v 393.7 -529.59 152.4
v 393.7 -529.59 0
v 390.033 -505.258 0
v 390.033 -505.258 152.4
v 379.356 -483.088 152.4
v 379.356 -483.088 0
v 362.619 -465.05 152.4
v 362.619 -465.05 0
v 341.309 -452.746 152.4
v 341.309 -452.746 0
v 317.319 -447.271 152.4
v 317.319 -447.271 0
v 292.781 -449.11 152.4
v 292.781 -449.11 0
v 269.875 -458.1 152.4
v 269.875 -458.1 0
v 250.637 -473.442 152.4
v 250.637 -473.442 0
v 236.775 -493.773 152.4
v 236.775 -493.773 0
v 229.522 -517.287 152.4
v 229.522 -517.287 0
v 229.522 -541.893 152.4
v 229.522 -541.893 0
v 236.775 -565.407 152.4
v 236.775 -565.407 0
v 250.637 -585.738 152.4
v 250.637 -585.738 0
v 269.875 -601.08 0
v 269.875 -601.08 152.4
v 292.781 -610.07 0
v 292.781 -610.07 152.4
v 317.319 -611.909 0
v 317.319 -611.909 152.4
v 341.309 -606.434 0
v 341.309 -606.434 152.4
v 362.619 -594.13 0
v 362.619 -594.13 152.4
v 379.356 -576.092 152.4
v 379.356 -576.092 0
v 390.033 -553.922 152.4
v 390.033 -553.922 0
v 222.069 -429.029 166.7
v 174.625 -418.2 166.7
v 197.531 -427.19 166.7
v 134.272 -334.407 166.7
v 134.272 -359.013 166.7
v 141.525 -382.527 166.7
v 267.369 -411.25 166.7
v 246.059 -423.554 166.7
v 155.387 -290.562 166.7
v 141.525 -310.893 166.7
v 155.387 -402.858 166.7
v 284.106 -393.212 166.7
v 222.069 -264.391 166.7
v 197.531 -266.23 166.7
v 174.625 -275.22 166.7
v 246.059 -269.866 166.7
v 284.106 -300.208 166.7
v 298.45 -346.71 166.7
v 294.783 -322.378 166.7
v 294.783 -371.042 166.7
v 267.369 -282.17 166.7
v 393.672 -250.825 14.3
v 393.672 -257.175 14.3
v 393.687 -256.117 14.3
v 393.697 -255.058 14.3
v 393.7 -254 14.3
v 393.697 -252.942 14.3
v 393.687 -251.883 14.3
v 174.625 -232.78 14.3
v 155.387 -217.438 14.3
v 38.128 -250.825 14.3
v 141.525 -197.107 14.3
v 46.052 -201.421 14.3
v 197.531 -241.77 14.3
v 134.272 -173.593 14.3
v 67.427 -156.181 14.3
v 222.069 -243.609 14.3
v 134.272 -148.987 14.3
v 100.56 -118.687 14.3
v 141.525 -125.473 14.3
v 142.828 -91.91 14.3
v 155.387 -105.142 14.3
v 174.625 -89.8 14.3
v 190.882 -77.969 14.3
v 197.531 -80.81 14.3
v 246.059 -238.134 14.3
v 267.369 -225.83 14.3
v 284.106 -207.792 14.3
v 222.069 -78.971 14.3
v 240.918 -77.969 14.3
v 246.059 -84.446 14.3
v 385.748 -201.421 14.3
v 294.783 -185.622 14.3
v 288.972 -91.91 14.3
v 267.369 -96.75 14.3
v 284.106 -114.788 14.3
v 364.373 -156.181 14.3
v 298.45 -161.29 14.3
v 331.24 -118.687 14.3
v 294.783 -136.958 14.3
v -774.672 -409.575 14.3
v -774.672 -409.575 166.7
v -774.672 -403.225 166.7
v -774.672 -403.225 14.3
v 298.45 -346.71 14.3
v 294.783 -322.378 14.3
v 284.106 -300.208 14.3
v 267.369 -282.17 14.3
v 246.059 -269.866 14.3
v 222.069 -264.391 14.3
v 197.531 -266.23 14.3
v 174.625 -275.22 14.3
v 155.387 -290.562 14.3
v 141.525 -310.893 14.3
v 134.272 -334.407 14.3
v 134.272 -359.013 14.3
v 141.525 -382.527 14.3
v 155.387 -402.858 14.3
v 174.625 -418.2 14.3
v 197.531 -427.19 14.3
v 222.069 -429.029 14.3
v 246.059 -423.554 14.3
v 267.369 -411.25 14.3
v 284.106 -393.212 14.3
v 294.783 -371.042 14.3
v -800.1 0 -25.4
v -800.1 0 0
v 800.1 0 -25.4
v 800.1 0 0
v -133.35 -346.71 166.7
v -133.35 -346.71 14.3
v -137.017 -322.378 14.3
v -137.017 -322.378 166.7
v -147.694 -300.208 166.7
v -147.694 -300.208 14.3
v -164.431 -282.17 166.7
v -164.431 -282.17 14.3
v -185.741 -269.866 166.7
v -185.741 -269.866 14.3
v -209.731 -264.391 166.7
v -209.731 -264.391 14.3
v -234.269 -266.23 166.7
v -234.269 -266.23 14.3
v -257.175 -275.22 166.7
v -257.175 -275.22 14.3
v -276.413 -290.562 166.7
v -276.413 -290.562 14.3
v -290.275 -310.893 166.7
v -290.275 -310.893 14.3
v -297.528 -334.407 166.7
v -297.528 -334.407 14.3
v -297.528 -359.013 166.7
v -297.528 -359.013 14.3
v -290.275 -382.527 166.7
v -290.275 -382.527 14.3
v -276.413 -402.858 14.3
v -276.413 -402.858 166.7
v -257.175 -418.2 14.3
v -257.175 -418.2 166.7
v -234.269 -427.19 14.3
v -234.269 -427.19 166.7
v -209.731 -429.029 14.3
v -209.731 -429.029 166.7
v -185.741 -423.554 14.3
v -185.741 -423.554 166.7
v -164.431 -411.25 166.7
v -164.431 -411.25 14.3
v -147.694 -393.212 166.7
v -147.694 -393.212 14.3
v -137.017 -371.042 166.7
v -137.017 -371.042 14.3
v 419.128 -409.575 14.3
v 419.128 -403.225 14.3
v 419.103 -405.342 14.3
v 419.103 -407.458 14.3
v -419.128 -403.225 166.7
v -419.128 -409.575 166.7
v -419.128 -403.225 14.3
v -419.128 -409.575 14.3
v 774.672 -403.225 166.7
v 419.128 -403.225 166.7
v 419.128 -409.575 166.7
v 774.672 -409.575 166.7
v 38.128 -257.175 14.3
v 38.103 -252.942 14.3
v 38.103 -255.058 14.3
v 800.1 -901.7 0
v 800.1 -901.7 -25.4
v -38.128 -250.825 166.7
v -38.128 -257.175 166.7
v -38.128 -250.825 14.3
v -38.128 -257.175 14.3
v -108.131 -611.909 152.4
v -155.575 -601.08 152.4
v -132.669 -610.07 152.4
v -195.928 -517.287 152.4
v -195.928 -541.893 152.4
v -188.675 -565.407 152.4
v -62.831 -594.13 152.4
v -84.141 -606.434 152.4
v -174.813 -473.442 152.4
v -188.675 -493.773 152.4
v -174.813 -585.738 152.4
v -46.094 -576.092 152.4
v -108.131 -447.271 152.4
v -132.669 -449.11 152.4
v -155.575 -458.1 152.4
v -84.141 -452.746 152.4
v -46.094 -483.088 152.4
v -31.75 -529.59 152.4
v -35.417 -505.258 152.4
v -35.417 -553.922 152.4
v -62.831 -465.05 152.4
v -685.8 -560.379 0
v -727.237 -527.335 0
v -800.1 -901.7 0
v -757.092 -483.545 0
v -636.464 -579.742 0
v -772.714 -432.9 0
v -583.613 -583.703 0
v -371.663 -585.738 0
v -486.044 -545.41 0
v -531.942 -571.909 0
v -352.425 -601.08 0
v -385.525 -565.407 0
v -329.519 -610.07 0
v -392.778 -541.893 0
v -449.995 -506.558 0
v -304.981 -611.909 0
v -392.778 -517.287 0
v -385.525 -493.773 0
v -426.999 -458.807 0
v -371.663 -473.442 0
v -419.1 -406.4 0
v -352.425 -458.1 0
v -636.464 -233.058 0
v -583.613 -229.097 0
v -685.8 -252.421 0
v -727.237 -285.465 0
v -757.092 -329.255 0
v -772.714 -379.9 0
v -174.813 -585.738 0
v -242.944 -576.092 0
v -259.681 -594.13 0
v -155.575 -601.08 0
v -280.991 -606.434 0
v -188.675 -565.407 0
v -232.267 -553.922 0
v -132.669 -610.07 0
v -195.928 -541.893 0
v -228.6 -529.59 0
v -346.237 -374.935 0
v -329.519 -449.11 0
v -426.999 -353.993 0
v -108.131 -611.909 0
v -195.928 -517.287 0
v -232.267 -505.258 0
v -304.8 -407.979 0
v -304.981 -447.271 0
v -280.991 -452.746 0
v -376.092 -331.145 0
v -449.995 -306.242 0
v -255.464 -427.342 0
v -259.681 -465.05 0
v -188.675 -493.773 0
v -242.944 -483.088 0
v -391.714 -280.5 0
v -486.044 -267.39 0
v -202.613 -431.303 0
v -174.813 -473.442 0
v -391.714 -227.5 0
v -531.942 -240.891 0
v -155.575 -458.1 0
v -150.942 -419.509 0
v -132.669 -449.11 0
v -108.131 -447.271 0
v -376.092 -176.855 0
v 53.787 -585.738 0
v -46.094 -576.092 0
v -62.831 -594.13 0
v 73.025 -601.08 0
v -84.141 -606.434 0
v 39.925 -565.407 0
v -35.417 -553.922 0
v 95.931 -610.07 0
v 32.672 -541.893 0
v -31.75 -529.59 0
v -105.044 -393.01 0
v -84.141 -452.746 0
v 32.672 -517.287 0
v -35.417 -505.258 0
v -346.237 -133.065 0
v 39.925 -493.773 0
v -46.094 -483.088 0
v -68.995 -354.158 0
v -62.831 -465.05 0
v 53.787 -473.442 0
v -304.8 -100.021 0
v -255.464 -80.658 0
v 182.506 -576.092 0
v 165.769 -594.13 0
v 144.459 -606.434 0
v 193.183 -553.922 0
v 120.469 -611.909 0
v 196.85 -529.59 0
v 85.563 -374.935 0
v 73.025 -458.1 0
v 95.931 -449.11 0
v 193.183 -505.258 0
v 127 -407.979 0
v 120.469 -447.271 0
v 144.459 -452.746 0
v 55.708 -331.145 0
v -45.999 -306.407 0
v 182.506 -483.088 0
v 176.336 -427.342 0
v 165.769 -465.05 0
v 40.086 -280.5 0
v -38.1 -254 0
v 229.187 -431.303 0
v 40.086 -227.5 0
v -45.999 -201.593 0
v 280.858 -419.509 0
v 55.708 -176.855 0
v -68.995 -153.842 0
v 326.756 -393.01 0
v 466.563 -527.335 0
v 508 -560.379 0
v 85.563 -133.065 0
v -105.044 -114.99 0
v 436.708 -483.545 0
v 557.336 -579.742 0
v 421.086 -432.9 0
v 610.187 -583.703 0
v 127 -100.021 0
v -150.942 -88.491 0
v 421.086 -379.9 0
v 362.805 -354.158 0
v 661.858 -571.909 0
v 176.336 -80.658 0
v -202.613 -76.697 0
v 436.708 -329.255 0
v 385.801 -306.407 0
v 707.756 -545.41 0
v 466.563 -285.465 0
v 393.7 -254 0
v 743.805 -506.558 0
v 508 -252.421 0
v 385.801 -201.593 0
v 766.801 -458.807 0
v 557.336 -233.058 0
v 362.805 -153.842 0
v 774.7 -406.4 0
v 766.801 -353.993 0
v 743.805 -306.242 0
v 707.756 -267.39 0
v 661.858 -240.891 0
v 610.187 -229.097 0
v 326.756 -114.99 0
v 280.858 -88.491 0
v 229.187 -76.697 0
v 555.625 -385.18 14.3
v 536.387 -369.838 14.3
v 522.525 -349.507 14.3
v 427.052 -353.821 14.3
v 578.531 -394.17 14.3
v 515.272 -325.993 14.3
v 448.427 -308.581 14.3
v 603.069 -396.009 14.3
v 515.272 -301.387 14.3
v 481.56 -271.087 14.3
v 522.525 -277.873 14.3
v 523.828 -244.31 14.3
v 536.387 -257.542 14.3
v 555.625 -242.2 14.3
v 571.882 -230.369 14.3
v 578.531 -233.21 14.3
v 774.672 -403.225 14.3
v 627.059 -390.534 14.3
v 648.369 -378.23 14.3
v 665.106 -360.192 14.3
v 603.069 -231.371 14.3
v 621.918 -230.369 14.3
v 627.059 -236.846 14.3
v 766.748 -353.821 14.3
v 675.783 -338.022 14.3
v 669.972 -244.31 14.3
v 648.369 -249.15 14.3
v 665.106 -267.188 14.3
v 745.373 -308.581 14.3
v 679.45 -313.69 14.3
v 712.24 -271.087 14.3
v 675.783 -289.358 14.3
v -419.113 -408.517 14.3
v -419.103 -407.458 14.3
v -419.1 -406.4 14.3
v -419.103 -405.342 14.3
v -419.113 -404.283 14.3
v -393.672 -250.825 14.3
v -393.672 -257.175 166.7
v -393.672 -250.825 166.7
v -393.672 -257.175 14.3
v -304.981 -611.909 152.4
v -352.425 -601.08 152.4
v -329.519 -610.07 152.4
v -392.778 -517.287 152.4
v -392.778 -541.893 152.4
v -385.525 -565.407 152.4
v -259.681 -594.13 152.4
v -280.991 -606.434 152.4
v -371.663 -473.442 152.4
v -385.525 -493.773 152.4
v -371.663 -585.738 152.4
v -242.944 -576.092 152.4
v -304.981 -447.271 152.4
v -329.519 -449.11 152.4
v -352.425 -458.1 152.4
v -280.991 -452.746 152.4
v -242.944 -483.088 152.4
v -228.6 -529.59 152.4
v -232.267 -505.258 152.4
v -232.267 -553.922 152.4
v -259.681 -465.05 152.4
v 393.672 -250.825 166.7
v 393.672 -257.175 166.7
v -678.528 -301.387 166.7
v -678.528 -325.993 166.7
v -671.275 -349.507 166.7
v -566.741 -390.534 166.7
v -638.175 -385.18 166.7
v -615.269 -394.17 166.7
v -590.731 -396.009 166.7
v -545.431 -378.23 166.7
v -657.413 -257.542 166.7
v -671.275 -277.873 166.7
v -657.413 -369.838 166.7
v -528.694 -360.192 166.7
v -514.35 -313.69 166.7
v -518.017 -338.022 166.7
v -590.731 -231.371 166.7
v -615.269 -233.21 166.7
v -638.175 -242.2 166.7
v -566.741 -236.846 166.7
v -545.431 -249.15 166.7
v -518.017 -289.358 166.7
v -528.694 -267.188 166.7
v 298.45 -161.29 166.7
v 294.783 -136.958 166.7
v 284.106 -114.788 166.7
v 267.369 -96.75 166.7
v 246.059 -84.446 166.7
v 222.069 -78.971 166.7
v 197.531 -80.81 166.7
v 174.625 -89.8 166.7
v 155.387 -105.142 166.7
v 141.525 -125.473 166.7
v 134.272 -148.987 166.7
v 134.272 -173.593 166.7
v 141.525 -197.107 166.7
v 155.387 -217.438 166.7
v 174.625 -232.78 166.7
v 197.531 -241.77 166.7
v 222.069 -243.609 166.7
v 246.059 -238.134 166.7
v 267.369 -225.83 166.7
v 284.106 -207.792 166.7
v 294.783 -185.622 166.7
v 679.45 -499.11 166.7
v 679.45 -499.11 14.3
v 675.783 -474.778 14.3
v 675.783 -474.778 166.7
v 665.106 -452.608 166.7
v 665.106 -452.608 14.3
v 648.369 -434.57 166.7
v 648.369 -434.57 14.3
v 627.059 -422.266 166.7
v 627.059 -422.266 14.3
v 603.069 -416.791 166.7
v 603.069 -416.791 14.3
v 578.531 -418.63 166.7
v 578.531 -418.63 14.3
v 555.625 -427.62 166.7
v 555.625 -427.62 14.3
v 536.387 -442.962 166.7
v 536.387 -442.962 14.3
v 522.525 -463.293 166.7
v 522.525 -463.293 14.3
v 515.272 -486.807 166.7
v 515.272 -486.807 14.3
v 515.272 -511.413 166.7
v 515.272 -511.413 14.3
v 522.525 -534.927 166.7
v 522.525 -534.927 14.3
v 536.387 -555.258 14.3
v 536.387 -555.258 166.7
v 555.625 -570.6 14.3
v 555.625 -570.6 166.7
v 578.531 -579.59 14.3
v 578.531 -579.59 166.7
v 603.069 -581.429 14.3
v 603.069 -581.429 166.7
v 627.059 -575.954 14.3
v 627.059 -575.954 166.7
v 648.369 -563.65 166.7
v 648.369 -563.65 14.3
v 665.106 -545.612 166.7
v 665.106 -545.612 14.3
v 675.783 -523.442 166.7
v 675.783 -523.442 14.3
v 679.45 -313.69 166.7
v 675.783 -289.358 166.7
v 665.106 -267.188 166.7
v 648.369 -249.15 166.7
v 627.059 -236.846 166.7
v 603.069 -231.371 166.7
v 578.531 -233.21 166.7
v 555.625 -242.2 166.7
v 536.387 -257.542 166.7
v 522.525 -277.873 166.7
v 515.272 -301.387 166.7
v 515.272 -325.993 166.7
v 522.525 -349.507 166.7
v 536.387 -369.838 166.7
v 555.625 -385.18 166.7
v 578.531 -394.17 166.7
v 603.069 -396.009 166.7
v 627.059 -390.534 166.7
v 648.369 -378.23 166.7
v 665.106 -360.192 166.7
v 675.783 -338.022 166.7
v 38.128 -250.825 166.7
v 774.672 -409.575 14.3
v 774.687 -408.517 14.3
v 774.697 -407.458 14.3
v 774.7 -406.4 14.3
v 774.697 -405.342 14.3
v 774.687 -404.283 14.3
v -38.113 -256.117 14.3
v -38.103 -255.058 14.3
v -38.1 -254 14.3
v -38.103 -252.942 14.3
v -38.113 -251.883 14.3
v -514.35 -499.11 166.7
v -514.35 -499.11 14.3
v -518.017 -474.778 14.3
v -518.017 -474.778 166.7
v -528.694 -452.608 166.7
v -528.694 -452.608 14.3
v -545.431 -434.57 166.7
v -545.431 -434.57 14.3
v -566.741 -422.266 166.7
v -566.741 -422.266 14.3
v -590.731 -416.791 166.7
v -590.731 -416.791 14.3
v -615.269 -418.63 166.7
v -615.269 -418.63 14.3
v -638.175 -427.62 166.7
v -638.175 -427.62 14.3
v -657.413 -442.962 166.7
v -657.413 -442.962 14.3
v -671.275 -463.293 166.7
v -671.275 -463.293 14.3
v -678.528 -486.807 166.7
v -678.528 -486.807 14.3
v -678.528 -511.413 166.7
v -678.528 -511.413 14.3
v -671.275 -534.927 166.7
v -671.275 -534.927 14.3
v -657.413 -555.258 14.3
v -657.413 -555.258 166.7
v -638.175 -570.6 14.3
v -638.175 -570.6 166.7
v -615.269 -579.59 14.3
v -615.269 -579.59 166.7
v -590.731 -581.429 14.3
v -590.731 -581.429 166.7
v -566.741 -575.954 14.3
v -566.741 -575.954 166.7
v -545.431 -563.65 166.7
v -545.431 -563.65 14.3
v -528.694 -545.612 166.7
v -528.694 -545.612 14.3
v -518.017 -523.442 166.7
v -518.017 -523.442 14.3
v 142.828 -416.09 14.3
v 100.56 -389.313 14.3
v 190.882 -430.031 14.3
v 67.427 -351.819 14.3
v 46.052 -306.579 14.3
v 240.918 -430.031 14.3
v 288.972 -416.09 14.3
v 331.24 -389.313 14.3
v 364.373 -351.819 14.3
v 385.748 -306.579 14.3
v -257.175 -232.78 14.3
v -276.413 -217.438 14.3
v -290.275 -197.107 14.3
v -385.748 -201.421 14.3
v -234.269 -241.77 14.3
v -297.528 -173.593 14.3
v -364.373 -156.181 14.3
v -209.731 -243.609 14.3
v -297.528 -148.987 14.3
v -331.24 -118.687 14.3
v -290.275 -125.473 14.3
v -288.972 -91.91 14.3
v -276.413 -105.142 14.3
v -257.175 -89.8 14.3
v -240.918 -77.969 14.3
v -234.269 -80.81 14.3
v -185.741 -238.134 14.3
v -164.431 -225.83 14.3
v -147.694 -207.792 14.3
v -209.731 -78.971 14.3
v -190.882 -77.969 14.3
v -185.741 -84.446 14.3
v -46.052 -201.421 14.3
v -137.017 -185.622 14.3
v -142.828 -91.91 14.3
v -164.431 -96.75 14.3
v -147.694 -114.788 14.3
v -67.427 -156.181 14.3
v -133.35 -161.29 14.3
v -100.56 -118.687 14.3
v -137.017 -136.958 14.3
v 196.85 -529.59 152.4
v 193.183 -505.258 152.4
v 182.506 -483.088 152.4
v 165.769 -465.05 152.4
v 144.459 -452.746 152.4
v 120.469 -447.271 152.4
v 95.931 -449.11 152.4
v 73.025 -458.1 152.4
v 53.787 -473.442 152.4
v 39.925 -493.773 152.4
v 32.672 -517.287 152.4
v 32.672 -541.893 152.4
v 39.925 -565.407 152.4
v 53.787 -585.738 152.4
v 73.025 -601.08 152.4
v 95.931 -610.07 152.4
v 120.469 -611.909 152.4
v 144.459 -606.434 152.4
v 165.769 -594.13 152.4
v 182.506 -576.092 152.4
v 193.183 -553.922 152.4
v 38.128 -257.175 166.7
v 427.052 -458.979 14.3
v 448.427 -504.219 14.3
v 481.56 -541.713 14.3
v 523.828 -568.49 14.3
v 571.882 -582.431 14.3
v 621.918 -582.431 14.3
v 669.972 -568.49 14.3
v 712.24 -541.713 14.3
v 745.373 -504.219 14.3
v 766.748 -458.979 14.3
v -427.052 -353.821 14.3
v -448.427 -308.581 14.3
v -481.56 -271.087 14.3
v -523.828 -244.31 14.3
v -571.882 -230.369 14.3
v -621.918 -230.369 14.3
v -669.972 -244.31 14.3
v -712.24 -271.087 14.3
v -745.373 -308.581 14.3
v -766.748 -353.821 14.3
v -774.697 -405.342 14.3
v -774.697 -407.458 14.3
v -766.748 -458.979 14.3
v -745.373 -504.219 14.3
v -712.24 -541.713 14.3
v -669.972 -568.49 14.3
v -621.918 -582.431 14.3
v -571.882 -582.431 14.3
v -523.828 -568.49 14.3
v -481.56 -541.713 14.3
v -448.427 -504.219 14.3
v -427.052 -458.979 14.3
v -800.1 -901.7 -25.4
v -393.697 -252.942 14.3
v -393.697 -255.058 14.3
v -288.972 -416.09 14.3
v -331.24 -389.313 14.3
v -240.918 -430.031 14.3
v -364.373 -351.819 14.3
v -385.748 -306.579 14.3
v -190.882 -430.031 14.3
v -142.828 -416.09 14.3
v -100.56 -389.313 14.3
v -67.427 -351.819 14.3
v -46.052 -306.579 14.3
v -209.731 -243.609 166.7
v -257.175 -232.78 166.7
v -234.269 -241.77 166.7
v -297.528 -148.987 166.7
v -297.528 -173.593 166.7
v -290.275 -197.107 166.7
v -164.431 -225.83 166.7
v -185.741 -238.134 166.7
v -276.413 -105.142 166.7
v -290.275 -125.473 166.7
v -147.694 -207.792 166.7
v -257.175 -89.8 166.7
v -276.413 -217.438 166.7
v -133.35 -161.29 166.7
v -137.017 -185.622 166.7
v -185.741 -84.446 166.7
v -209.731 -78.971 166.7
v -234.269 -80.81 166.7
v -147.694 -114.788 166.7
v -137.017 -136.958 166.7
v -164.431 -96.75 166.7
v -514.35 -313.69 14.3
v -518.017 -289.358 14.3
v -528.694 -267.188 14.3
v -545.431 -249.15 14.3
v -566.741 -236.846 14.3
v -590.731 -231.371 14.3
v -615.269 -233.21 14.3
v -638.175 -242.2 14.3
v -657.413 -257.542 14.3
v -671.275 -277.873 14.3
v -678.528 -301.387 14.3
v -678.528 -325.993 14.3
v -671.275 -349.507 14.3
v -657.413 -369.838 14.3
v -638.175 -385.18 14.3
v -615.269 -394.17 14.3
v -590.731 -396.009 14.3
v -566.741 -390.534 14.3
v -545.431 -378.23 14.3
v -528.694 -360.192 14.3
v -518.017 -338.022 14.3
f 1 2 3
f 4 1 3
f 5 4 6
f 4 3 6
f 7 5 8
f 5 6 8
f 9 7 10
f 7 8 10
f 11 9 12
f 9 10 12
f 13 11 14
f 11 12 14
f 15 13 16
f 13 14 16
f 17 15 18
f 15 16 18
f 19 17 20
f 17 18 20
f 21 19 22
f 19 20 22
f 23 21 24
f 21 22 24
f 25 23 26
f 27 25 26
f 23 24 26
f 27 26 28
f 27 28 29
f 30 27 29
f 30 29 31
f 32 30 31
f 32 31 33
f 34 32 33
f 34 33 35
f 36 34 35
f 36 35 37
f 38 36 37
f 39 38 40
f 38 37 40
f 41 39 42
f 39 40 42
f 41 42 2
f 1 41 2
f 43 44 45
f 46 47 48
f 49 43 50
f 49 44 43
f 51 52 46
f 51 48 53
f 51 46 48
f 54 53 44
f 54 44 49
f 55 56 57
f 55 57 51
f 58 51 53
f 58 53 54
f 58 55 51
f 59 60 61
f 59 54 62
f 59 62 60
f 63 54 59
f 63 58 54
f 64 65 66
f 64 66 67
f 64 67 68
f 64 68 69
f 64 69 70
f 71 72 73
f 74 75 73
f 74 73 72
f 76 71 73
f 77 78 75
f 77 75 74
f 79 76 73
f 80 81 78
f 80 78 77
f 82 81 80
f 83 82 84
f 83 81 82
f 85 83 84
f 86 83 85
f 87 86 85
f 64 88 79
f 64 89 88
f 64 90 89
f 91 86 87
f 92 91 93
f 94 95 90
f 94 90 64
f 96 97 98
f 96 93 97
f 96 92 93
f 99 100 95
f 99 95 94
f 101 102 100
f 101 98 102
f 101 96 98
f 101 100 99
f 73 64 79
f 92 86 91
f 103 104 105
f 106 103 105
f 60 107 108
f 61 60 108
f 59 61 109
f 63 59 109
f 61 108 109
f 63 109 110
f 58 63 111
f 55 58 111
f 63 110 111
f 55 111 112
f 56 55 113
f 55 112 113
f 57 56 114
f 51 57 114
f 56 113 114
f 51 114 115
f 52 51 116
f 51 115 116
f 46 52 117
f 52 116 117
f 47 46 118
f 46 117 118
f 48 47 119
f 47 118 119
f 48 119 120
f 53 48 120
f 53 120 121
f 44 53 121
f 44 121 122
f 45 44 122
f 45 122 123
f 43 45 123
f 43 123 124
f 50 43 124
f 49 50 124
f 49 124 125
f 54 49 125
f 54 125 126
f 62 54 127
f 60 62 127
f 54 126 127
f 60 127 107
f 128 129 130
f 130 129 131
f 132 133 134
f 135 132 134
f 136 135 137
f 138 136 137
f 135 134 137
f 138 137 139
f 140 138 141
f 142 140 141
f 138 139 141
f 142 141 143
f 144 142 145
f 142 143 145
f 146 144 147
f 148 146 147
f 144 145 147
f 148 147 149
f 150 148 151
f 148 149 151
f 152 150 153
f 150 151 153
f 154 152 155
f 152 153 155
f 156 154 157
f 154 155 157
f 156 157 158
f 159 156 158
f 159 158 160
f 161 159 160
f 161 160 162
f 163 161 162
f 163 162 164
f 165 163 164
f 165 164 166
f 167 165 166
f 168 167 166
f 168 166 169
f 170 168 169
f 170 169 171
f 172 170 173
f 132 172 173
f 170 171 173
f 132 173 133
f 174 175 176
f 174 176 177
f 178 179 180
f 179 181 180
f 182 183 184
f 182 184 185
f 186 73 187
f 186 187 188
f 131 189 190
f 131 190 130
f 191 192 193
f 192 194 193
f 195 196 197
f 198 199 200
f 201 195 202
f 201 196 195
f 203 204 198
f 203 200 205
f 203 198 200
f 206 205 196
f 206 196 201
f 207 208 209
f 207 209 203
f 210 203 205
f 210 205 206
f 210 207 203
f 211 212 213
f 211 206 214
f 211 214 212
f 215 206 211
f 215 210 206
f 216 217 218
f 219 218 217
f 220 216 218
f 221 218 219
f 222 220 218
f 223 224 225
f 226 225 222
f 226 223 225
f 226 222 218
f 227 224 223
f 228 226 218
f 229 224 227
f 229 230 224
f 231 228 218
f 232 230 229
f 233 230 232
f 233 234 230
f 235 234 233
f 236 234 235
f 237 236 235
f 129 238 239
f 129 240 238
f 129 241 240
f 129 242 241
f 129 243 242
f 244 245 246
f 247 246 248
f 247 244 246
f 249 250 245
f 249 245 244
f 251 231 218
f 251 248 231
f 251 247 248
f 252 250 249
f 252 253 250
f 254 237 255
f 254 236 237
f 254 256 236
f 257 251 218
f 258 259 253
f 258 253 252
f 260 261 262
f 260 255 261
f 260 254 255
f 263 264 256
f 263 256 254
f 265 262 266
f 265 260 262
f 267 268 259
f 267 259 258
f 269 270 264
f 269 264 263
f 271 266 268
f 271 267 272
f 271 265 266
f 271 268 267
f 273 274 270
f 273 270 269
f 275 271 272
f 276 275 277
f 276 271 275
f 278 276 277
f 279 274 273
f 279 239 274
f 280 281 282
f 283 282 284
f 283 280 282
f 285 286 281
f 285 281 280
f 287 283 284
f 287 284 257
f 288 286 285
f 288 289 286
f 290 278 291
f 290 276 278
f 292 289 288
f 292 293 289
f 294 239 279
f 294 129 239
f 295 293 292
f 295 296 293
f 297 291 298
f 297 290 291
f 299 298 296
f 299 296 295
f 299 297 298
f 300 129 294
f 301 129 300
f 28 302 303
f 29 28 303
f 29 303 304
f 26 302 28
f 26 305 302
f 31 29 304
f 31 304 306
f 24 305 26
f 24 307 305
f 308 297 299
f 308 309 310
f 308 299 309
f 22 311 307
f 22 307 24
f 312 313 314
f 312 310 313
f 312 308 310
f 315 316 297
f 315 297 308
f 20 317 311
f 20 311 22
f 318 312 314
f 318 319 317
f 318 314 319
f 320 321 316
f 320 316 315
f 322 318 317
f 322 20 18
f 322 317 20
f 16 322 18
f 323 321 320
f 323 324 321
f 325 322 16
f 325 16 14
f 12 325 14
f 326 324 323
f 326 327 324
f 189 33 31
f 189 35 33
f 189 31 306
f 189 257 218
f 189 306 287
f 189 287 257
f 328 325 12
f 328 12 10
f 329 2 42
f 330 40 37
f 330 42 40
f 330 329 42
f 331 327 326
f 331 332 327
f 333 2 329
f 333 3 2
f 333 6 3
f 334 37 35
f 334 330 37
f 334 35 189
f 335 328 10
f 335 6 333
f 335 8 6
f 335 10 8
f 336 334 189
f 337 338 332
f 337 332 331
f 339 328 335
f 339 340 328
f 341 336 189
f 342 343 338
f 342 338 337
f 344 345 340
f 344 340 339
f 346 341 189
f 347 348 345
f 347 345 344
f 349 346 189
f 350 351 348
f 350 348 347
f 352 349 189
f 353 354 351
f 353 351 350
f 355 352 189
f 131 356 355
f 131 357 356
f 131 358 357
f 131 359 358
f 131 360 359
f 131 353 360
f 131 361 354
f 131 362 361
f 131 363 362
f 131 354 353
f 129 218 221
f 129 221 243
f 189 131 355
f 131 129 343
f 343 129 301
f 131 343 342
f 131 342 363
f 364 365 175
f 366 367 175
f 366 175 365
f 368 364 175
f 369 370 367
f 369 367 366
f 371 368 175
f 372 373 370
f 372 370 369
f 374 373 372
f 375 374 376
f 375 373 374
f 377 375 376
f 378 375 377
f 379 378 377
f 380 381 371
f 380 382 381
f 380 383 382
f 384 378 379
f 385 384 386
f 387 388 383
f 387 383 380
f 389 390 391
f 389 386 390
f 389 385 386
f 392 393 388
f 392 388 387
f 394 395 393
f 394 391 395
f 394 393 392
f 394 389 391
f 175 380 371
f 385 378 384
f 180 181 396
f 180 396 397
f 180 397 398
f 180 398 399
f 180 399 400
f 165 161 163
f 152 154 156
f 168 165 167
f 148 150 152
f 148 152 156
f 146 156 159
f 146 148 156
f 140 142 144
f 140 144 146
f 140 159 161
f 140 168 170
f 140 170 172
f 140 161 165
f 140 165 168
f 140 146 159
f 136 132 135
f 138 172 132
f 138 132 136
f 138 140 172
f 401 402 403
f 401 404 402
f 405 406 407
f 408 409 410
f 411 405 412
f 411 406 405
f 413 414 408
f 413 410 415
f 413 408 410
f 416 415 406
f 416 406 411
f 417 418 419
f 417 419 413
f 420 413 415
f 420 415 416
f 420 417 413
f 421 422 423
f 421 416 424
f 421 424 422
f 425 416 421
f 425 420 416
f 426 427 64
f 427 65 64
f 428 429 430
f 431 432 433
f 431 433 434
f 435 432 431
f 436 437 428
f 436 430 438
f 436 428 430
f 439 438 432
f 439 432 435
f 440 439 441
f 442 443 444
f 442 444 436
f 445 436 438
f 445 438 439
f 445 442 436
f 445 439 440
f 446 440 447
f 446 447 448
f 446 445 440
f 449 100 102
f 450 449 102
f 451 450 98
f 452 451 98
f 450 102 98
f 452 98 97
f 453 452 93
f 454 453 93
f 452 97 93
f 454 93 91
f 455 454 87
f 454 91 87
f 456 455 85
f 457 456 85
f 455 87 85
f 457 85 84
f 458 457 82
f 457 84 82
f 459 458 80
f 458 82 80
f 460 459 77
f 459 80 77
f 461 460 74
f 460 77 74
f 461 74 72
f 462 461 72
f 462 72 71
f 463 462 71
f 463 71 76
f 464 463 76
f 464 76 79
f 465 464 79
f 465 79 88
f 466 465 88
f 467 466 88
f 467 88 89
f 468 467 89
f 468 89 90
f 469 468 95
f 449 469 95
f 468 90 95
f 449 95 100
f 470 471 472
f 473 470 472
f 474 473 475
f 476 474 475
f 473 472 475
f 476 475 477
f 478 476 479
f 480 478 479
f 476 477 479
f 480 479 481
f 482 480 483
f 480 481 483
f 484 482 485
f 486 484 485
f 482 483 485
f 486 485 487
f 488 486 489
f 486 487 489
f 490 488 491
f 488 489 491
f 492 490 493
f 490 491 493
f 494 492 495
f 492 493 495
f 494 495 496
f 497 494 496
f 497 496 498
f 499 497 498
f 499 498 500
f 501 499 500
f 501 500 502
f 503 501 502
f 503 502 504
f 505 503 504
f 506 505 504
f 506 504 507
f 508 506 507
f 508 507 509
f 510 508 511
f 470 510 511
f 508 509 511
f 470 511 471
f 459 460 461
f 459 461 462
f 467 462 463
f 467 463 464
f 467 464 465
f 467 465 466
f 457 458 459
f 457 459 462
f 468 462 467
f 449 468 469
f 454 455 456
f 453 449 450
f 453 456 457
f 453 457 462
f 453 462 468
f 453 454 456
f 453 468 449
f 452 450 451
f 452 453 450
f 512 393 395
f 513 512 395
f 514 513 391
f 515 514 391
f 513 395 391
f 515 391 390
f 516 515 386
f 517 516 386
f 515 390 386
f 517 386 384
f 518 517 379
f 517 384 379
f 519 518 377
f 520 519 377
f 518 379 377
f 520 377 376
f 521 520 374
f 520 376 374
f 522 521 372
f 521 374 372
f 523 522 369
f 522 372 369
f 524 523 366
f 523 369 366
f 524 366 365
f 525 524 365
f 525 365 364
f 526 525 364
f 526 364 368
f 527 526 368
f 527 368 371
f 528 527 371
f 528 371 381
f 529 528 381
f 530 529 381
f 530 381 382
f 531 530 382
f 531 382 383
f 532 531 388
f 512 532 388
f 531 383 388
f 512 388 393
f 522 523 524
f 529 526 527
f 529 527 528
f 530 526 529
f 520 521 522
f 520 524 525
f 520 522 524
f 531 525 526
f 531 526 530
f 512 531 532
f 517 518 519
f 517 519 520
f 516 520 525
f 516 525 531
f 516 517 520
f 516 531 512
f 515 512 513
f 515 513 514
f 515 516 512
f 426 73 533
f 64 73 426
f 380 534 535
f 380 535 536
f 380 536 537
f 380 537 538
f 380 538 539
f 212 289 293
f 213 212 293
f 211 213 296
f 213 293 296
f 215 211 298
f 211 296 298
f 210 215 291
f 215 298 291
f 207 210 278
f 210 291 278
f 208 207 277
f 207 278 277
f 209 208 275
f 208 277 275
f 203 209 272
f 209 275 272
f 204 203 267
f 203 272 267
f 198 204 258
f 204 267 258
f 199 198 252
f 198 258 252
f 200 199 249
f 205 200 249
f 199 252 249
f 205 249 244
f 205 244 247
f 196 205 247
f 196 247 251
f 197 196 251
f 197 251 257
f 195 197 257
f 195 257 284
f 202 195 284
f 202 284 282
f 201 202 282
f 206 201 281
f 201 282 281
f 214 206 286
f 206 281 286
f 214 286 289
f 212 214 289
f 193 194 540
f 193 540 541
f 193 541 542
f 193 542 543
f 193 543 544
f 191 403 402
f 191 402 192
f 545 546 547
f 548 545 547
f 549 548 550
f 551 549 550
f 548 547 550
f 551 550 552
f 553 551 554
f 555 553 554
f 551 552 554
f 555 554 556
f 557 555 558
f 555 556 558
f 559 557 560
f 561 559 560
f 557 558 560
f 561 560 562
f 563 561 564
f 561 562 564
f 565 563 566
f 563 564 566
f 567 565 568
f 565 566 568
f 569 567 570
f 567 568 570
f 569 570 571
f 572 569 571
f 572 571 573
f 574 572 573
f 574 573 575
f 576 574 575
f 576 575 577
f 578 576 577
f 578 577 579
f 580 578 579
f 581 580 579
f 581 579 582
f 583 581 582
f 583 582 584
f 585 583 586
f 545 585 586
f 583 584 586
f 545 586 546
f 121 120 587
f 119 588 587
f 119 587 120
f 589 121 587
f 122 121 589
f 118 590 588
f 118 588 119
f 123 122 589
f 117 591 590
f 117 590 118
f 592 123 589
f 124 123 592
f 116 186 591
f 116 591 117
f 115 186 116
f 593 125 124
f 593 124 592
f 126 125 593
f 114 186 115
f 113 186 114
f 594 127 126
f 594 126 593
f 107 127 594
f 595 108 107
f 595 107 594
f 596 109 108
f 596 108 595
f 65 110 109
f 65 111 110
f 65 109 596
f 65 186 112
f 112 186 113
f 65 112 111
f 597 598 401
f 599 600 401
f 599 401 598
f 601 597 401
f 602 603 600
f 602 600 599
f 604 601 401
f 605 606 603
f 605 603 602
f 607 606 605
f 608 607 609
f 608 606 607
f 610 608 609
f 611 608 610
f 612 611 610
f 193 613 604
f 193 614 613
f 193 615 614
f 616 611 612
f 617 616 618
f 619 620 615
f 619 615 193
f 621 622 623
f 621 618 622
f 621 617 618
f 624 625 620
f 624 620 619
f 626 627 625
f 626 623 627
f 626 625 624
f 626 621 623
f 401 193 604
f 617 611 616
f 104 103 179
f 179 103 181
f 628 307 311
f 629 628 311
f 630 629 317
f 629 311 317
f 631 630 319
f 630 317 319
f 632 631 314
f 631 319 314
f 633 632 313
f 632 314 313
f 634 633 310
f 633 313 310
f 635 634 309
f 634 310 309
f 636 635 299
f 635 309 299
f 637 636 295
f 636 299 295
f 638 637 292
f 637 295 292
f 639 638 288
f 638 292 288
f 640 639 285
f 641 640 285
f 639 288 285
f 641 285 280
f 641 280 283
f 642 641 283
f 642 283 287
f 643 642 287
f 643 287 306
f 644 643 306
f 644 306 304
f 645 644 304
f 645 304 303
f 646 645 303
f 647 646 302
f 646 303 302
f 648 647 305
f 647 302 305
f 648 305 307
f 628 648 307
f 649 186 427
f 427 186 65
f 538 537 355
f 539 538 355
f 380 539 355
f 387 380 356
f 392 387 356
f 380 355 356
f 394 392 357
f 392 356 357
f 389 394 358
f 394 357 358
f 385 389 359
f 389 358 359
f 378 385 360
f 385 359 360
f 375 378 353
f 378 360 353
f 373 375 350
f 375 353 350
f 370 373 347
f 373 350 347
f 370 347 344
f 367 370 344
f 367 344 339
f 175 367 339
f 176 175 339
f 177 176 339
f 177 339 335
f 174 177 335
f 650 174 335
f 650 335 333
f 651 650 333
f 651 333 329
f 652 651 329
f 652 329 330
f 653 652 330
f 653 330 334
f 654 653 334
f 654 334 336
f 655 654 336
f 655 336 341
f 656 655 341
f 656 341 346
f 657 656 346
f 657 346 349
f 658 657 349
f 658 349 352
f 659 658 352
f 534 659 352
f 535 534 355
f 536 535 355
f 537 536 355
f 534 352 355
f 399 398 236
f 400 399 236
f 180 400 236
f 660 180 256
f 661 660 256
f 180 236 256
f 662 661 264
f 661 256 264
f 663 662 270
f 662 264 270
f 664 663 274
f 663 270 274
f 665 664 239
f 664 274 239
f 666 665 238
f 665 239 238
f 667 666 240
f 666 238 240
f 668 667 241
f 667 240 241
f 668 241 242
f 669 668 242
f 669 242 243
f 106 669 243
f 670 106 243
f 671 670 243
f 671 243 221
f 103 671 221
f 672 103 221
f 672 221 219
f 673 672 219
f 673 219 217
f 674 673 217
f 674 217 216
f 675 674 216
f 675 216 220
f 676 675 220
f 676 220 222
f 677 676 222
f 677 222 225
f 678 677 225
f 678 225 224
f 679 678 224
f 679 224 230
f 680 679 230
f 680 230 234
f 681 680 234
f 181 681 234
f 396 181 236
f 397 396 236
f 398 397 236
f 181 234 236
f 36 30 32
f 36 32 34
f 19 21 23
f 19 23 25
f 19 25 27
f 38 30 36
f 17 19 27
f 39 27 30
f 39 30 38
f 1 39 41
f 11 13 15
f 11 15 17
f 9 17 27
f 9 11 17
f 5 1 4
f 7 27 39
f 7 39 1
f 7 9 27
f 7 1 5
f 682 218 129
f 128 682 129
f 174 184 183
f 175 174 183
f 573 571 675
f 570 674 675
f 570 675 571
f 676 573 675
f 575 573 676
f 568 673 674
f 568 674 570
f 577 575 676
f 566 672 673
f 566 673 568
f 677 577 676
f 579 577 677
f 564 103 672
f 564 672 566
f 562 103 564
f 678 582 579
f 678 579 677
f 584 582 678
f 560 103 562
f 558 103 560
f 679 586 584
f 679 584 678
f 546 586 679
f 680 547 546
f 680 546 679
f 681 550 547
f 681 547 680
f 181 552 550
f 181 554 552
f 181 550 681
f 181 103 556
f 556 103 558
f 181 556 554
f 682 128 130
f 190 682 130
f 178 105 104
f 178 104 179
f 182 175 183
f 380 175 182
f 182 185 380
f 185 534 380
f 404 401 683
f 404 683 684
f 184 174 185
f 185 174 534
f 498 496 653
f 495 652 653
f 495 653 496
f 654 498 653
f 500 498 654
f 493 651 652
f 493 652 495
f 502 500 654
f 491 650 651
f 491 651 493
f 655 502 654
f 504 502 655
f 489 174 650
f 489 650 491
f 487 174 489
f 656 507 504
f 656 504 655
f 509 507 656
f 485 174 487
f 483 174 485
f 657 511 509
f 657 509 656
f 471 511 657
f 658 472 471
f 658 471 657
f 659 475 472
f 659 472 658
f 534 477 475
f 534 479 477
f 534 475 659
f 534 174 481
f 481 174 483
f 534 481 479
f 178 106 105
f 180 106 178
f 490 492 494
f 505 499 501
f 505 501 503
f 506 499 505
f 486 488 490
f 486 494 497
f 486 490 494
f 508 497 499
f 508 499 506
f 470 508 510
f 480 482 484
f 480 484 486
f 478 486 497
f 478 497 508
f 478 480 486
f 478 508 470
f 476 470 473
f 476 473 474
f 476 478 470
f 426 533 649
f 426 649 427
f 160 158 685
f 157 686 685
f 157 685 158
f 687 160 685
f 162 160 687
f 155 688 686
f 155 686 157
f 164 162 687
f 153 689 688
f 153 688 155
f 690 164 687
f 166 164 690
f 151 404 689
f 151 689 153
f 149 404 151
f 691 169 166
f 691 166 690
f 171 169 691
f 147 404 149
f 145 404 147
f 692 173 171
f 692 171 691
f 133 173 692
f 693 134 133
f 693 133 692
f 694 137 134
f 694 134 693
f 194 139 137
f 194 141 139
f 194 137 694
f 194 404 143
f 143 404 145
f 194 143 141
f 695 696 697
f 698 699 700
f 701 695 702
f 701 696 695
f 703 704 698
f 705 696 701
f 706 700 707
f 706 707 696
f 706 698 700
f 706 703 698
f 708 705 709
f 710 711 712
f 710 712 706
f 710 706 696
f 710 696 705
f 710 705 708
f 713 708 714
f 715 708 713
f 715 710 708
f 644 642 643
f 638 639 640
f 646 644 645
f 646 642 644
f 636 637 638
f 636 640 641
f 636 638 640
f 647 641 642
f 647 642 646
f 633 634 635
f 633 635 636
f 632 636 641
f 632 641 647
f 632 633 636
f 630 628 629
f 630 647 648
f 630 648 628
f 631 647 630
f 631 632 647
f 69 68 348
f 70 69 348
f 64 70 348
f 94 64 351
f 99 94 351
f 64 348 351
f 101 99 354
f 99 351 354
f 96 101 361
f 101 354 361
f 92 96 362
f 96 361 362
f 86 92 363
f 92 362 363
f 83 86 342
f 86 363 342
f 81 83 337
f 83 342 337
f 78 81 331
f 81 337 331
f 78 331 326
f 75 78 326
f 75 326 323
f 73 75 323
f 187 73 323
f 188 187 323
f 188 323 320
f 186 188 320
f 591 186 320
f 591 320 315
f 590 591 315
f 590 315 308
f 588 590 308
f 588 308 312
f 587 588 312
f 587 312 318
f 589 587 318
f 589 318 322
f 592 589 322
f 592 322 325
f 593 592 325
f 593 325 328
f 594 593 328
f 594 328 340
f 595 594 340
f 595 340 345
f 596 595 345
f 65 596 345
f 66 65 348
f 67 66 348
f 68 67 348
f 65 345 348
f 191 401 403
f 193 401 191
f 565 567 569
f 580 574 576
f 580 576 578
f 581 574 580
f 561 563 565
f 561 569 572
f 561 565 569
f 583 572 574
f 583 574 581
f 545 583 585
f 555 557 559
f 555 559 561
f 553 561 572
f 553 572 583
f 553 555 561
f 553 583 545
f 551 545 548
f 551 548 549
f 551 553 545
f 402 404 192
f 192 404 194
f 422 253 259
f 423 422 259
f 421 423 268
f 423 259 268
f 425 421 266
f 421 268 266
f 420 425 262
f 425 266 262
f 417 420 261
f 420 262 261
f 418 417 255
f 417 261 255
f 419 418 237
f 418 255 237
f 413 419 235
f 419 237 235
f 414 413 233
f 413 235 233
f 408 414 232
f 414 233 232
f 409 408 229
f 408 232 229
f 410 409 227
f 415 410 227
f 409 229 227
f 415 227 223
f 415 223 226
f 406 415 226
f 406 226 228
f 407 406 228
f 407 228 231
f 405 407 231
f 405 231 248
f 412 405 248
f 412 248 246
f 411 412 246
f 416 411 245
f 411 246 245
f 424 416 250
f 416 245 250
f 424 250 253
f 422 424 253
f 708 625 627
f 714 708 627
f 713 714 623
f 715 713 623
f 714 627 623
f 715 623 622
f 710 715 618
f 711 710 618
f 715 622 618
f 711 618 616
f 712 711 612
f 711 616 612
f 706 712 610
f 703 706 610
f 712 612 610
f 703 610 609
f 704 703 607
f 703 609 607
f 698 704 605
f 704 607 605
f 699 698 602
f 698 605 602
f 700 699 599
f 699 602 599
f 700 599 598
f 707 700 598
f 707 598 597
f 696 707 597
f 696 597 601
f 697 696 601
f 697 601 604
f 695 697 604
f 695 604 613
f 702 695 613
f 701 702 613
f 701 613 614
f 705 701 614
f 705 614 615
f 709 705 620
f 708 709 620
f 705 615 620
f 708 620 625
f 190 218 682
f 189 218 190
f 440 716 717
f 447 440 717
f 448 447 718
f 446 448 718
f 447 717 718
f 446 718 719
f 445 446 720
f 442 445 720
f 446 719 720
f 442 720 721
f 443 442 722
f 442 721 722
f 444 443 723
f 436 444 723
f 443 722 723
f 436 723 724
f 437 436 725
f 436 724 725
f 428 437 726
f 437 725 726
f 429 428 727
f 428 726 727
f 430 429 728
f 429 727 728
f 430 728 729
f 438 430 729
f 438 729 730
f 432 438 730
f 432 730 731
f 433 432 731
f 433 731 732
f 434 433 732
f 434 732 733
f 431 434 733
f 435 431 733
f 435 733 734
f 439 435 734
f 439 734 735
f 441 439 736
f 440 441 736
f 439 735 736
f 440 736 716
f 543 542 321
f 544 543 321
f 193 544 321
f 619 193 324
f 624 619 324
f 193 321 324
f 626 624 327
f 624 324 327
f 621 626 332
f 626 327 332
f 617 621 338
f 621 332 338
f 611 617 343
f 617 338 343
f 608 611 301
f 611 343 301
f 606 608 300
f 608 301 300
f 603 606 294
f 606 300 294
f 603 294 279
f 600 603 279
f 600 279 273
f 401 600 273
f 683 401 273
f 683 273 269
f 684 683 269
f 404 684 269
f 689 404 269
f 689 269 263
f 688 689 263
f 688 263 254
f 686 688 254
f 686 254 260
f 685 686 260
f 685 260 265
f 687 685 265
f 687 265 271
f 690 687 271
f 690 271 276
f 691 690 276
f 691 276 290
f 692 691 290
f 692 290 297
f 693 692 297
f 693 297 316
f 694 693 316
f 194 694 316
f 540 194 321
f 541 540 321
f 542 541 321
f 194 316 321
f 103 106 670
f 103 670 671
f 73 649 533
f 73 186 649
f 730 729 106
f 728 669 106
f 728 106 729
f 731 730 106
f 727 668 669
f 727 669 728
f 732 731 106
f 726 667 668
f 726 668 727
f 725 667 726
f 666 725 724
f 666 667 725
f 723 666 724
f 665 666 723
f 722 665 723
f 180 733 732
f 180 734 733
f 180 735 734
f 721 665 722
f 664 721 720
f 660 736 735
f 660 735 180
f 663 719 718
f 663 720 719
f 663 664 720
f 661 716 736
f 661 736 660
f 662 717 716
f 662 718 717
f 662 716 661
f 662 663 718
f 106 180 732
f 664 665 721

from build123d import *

# Parameters (mm, degrees)
F0_W     = 1600.2
F0_H     = 901.7
F1_DEPTH = 25.4
F2_R     = 177.8
F3_DEPTH = 14.3002
F4_W     = 355.5433
F4_H     = 6.35
F4_R     = 82.55
F5_DEPTH = 152.4
F6_R     = 82.55
F7_DEPTH = 152.4


with BuildPart() as f1:
    # F0 (on Top) → F1 (new body)
    with BuildSketch(Plane.XY):
        with Locations((0, -450.85)):
            Rectangle(F0_W, F0_H)
    extrude(amount=-F1_DEPTH)

    # F2 (on face) → F3 (join)
    with BuildSketch(Plane.XY):
        with Locations((-596.9, -406.4)):
            Circle(F2_R)
        with Locations((-215.9, -254)):
            Circle(F2_R)
        with Locations((215.9, -254)):
            Circle(F2_R)
        with Locations((596.9, -406.4)):
            Circle(F2_R)
    extrude(amount=F3_DEPTH)

    # F4 (on face) → F5 (join)
    with BuildSketch(Plane.XY.offset(14.3002)):
        with Locations((-596.9, -406.4)):
            Rectangle(F4_W, F4_H)
        with Locations((-215.9, -254)):
            Rectangle(F4_W, F4_H)
        with Locations((215.9, -254)):
            Rectangle(F4_W, F4_H)
        with Locations((596.9, -406.4)):
            Rectangle(F4_W, F4_H)
        with Locations((-596.9, -499.11)):
            Circle(F4_R)
        with Locations((-596.9, -313.69)):
            Circle(F4_R)
        with Locations((-215.9, -161.29)):
            Circle(F4_R)
        with Locations((-215.9, -346.71)):
            Circle(F4_R)
        with Locations((215.9, -346.71)):
            Circle(F4_R)
        with Locations((215.9, -161.29)):
            Circle(F4_R)
        with Locations((596.9, -313.69)):
            Circle(F4_R)
        with Locations((596.9, -499.11)):
            Circle(F4_R)
    extrude(amount=F5_DEPTH)

    # F6 (on face) → F7 (join)
    with BuildSketch(Plane.XY):
        with Locations((-311.15, -529.59)):
            Circle(F6_R)
        with Locations((-114.3, -529.59)):
            Circle(F6_R)
        with Locations((114.3, -529.59)):
            Circle(F6_R)
        with Locations((311.15, -529.59)):
            Circle(F6_R)
    extrude(amount=F7_DEPTH)


solid = f1.part
